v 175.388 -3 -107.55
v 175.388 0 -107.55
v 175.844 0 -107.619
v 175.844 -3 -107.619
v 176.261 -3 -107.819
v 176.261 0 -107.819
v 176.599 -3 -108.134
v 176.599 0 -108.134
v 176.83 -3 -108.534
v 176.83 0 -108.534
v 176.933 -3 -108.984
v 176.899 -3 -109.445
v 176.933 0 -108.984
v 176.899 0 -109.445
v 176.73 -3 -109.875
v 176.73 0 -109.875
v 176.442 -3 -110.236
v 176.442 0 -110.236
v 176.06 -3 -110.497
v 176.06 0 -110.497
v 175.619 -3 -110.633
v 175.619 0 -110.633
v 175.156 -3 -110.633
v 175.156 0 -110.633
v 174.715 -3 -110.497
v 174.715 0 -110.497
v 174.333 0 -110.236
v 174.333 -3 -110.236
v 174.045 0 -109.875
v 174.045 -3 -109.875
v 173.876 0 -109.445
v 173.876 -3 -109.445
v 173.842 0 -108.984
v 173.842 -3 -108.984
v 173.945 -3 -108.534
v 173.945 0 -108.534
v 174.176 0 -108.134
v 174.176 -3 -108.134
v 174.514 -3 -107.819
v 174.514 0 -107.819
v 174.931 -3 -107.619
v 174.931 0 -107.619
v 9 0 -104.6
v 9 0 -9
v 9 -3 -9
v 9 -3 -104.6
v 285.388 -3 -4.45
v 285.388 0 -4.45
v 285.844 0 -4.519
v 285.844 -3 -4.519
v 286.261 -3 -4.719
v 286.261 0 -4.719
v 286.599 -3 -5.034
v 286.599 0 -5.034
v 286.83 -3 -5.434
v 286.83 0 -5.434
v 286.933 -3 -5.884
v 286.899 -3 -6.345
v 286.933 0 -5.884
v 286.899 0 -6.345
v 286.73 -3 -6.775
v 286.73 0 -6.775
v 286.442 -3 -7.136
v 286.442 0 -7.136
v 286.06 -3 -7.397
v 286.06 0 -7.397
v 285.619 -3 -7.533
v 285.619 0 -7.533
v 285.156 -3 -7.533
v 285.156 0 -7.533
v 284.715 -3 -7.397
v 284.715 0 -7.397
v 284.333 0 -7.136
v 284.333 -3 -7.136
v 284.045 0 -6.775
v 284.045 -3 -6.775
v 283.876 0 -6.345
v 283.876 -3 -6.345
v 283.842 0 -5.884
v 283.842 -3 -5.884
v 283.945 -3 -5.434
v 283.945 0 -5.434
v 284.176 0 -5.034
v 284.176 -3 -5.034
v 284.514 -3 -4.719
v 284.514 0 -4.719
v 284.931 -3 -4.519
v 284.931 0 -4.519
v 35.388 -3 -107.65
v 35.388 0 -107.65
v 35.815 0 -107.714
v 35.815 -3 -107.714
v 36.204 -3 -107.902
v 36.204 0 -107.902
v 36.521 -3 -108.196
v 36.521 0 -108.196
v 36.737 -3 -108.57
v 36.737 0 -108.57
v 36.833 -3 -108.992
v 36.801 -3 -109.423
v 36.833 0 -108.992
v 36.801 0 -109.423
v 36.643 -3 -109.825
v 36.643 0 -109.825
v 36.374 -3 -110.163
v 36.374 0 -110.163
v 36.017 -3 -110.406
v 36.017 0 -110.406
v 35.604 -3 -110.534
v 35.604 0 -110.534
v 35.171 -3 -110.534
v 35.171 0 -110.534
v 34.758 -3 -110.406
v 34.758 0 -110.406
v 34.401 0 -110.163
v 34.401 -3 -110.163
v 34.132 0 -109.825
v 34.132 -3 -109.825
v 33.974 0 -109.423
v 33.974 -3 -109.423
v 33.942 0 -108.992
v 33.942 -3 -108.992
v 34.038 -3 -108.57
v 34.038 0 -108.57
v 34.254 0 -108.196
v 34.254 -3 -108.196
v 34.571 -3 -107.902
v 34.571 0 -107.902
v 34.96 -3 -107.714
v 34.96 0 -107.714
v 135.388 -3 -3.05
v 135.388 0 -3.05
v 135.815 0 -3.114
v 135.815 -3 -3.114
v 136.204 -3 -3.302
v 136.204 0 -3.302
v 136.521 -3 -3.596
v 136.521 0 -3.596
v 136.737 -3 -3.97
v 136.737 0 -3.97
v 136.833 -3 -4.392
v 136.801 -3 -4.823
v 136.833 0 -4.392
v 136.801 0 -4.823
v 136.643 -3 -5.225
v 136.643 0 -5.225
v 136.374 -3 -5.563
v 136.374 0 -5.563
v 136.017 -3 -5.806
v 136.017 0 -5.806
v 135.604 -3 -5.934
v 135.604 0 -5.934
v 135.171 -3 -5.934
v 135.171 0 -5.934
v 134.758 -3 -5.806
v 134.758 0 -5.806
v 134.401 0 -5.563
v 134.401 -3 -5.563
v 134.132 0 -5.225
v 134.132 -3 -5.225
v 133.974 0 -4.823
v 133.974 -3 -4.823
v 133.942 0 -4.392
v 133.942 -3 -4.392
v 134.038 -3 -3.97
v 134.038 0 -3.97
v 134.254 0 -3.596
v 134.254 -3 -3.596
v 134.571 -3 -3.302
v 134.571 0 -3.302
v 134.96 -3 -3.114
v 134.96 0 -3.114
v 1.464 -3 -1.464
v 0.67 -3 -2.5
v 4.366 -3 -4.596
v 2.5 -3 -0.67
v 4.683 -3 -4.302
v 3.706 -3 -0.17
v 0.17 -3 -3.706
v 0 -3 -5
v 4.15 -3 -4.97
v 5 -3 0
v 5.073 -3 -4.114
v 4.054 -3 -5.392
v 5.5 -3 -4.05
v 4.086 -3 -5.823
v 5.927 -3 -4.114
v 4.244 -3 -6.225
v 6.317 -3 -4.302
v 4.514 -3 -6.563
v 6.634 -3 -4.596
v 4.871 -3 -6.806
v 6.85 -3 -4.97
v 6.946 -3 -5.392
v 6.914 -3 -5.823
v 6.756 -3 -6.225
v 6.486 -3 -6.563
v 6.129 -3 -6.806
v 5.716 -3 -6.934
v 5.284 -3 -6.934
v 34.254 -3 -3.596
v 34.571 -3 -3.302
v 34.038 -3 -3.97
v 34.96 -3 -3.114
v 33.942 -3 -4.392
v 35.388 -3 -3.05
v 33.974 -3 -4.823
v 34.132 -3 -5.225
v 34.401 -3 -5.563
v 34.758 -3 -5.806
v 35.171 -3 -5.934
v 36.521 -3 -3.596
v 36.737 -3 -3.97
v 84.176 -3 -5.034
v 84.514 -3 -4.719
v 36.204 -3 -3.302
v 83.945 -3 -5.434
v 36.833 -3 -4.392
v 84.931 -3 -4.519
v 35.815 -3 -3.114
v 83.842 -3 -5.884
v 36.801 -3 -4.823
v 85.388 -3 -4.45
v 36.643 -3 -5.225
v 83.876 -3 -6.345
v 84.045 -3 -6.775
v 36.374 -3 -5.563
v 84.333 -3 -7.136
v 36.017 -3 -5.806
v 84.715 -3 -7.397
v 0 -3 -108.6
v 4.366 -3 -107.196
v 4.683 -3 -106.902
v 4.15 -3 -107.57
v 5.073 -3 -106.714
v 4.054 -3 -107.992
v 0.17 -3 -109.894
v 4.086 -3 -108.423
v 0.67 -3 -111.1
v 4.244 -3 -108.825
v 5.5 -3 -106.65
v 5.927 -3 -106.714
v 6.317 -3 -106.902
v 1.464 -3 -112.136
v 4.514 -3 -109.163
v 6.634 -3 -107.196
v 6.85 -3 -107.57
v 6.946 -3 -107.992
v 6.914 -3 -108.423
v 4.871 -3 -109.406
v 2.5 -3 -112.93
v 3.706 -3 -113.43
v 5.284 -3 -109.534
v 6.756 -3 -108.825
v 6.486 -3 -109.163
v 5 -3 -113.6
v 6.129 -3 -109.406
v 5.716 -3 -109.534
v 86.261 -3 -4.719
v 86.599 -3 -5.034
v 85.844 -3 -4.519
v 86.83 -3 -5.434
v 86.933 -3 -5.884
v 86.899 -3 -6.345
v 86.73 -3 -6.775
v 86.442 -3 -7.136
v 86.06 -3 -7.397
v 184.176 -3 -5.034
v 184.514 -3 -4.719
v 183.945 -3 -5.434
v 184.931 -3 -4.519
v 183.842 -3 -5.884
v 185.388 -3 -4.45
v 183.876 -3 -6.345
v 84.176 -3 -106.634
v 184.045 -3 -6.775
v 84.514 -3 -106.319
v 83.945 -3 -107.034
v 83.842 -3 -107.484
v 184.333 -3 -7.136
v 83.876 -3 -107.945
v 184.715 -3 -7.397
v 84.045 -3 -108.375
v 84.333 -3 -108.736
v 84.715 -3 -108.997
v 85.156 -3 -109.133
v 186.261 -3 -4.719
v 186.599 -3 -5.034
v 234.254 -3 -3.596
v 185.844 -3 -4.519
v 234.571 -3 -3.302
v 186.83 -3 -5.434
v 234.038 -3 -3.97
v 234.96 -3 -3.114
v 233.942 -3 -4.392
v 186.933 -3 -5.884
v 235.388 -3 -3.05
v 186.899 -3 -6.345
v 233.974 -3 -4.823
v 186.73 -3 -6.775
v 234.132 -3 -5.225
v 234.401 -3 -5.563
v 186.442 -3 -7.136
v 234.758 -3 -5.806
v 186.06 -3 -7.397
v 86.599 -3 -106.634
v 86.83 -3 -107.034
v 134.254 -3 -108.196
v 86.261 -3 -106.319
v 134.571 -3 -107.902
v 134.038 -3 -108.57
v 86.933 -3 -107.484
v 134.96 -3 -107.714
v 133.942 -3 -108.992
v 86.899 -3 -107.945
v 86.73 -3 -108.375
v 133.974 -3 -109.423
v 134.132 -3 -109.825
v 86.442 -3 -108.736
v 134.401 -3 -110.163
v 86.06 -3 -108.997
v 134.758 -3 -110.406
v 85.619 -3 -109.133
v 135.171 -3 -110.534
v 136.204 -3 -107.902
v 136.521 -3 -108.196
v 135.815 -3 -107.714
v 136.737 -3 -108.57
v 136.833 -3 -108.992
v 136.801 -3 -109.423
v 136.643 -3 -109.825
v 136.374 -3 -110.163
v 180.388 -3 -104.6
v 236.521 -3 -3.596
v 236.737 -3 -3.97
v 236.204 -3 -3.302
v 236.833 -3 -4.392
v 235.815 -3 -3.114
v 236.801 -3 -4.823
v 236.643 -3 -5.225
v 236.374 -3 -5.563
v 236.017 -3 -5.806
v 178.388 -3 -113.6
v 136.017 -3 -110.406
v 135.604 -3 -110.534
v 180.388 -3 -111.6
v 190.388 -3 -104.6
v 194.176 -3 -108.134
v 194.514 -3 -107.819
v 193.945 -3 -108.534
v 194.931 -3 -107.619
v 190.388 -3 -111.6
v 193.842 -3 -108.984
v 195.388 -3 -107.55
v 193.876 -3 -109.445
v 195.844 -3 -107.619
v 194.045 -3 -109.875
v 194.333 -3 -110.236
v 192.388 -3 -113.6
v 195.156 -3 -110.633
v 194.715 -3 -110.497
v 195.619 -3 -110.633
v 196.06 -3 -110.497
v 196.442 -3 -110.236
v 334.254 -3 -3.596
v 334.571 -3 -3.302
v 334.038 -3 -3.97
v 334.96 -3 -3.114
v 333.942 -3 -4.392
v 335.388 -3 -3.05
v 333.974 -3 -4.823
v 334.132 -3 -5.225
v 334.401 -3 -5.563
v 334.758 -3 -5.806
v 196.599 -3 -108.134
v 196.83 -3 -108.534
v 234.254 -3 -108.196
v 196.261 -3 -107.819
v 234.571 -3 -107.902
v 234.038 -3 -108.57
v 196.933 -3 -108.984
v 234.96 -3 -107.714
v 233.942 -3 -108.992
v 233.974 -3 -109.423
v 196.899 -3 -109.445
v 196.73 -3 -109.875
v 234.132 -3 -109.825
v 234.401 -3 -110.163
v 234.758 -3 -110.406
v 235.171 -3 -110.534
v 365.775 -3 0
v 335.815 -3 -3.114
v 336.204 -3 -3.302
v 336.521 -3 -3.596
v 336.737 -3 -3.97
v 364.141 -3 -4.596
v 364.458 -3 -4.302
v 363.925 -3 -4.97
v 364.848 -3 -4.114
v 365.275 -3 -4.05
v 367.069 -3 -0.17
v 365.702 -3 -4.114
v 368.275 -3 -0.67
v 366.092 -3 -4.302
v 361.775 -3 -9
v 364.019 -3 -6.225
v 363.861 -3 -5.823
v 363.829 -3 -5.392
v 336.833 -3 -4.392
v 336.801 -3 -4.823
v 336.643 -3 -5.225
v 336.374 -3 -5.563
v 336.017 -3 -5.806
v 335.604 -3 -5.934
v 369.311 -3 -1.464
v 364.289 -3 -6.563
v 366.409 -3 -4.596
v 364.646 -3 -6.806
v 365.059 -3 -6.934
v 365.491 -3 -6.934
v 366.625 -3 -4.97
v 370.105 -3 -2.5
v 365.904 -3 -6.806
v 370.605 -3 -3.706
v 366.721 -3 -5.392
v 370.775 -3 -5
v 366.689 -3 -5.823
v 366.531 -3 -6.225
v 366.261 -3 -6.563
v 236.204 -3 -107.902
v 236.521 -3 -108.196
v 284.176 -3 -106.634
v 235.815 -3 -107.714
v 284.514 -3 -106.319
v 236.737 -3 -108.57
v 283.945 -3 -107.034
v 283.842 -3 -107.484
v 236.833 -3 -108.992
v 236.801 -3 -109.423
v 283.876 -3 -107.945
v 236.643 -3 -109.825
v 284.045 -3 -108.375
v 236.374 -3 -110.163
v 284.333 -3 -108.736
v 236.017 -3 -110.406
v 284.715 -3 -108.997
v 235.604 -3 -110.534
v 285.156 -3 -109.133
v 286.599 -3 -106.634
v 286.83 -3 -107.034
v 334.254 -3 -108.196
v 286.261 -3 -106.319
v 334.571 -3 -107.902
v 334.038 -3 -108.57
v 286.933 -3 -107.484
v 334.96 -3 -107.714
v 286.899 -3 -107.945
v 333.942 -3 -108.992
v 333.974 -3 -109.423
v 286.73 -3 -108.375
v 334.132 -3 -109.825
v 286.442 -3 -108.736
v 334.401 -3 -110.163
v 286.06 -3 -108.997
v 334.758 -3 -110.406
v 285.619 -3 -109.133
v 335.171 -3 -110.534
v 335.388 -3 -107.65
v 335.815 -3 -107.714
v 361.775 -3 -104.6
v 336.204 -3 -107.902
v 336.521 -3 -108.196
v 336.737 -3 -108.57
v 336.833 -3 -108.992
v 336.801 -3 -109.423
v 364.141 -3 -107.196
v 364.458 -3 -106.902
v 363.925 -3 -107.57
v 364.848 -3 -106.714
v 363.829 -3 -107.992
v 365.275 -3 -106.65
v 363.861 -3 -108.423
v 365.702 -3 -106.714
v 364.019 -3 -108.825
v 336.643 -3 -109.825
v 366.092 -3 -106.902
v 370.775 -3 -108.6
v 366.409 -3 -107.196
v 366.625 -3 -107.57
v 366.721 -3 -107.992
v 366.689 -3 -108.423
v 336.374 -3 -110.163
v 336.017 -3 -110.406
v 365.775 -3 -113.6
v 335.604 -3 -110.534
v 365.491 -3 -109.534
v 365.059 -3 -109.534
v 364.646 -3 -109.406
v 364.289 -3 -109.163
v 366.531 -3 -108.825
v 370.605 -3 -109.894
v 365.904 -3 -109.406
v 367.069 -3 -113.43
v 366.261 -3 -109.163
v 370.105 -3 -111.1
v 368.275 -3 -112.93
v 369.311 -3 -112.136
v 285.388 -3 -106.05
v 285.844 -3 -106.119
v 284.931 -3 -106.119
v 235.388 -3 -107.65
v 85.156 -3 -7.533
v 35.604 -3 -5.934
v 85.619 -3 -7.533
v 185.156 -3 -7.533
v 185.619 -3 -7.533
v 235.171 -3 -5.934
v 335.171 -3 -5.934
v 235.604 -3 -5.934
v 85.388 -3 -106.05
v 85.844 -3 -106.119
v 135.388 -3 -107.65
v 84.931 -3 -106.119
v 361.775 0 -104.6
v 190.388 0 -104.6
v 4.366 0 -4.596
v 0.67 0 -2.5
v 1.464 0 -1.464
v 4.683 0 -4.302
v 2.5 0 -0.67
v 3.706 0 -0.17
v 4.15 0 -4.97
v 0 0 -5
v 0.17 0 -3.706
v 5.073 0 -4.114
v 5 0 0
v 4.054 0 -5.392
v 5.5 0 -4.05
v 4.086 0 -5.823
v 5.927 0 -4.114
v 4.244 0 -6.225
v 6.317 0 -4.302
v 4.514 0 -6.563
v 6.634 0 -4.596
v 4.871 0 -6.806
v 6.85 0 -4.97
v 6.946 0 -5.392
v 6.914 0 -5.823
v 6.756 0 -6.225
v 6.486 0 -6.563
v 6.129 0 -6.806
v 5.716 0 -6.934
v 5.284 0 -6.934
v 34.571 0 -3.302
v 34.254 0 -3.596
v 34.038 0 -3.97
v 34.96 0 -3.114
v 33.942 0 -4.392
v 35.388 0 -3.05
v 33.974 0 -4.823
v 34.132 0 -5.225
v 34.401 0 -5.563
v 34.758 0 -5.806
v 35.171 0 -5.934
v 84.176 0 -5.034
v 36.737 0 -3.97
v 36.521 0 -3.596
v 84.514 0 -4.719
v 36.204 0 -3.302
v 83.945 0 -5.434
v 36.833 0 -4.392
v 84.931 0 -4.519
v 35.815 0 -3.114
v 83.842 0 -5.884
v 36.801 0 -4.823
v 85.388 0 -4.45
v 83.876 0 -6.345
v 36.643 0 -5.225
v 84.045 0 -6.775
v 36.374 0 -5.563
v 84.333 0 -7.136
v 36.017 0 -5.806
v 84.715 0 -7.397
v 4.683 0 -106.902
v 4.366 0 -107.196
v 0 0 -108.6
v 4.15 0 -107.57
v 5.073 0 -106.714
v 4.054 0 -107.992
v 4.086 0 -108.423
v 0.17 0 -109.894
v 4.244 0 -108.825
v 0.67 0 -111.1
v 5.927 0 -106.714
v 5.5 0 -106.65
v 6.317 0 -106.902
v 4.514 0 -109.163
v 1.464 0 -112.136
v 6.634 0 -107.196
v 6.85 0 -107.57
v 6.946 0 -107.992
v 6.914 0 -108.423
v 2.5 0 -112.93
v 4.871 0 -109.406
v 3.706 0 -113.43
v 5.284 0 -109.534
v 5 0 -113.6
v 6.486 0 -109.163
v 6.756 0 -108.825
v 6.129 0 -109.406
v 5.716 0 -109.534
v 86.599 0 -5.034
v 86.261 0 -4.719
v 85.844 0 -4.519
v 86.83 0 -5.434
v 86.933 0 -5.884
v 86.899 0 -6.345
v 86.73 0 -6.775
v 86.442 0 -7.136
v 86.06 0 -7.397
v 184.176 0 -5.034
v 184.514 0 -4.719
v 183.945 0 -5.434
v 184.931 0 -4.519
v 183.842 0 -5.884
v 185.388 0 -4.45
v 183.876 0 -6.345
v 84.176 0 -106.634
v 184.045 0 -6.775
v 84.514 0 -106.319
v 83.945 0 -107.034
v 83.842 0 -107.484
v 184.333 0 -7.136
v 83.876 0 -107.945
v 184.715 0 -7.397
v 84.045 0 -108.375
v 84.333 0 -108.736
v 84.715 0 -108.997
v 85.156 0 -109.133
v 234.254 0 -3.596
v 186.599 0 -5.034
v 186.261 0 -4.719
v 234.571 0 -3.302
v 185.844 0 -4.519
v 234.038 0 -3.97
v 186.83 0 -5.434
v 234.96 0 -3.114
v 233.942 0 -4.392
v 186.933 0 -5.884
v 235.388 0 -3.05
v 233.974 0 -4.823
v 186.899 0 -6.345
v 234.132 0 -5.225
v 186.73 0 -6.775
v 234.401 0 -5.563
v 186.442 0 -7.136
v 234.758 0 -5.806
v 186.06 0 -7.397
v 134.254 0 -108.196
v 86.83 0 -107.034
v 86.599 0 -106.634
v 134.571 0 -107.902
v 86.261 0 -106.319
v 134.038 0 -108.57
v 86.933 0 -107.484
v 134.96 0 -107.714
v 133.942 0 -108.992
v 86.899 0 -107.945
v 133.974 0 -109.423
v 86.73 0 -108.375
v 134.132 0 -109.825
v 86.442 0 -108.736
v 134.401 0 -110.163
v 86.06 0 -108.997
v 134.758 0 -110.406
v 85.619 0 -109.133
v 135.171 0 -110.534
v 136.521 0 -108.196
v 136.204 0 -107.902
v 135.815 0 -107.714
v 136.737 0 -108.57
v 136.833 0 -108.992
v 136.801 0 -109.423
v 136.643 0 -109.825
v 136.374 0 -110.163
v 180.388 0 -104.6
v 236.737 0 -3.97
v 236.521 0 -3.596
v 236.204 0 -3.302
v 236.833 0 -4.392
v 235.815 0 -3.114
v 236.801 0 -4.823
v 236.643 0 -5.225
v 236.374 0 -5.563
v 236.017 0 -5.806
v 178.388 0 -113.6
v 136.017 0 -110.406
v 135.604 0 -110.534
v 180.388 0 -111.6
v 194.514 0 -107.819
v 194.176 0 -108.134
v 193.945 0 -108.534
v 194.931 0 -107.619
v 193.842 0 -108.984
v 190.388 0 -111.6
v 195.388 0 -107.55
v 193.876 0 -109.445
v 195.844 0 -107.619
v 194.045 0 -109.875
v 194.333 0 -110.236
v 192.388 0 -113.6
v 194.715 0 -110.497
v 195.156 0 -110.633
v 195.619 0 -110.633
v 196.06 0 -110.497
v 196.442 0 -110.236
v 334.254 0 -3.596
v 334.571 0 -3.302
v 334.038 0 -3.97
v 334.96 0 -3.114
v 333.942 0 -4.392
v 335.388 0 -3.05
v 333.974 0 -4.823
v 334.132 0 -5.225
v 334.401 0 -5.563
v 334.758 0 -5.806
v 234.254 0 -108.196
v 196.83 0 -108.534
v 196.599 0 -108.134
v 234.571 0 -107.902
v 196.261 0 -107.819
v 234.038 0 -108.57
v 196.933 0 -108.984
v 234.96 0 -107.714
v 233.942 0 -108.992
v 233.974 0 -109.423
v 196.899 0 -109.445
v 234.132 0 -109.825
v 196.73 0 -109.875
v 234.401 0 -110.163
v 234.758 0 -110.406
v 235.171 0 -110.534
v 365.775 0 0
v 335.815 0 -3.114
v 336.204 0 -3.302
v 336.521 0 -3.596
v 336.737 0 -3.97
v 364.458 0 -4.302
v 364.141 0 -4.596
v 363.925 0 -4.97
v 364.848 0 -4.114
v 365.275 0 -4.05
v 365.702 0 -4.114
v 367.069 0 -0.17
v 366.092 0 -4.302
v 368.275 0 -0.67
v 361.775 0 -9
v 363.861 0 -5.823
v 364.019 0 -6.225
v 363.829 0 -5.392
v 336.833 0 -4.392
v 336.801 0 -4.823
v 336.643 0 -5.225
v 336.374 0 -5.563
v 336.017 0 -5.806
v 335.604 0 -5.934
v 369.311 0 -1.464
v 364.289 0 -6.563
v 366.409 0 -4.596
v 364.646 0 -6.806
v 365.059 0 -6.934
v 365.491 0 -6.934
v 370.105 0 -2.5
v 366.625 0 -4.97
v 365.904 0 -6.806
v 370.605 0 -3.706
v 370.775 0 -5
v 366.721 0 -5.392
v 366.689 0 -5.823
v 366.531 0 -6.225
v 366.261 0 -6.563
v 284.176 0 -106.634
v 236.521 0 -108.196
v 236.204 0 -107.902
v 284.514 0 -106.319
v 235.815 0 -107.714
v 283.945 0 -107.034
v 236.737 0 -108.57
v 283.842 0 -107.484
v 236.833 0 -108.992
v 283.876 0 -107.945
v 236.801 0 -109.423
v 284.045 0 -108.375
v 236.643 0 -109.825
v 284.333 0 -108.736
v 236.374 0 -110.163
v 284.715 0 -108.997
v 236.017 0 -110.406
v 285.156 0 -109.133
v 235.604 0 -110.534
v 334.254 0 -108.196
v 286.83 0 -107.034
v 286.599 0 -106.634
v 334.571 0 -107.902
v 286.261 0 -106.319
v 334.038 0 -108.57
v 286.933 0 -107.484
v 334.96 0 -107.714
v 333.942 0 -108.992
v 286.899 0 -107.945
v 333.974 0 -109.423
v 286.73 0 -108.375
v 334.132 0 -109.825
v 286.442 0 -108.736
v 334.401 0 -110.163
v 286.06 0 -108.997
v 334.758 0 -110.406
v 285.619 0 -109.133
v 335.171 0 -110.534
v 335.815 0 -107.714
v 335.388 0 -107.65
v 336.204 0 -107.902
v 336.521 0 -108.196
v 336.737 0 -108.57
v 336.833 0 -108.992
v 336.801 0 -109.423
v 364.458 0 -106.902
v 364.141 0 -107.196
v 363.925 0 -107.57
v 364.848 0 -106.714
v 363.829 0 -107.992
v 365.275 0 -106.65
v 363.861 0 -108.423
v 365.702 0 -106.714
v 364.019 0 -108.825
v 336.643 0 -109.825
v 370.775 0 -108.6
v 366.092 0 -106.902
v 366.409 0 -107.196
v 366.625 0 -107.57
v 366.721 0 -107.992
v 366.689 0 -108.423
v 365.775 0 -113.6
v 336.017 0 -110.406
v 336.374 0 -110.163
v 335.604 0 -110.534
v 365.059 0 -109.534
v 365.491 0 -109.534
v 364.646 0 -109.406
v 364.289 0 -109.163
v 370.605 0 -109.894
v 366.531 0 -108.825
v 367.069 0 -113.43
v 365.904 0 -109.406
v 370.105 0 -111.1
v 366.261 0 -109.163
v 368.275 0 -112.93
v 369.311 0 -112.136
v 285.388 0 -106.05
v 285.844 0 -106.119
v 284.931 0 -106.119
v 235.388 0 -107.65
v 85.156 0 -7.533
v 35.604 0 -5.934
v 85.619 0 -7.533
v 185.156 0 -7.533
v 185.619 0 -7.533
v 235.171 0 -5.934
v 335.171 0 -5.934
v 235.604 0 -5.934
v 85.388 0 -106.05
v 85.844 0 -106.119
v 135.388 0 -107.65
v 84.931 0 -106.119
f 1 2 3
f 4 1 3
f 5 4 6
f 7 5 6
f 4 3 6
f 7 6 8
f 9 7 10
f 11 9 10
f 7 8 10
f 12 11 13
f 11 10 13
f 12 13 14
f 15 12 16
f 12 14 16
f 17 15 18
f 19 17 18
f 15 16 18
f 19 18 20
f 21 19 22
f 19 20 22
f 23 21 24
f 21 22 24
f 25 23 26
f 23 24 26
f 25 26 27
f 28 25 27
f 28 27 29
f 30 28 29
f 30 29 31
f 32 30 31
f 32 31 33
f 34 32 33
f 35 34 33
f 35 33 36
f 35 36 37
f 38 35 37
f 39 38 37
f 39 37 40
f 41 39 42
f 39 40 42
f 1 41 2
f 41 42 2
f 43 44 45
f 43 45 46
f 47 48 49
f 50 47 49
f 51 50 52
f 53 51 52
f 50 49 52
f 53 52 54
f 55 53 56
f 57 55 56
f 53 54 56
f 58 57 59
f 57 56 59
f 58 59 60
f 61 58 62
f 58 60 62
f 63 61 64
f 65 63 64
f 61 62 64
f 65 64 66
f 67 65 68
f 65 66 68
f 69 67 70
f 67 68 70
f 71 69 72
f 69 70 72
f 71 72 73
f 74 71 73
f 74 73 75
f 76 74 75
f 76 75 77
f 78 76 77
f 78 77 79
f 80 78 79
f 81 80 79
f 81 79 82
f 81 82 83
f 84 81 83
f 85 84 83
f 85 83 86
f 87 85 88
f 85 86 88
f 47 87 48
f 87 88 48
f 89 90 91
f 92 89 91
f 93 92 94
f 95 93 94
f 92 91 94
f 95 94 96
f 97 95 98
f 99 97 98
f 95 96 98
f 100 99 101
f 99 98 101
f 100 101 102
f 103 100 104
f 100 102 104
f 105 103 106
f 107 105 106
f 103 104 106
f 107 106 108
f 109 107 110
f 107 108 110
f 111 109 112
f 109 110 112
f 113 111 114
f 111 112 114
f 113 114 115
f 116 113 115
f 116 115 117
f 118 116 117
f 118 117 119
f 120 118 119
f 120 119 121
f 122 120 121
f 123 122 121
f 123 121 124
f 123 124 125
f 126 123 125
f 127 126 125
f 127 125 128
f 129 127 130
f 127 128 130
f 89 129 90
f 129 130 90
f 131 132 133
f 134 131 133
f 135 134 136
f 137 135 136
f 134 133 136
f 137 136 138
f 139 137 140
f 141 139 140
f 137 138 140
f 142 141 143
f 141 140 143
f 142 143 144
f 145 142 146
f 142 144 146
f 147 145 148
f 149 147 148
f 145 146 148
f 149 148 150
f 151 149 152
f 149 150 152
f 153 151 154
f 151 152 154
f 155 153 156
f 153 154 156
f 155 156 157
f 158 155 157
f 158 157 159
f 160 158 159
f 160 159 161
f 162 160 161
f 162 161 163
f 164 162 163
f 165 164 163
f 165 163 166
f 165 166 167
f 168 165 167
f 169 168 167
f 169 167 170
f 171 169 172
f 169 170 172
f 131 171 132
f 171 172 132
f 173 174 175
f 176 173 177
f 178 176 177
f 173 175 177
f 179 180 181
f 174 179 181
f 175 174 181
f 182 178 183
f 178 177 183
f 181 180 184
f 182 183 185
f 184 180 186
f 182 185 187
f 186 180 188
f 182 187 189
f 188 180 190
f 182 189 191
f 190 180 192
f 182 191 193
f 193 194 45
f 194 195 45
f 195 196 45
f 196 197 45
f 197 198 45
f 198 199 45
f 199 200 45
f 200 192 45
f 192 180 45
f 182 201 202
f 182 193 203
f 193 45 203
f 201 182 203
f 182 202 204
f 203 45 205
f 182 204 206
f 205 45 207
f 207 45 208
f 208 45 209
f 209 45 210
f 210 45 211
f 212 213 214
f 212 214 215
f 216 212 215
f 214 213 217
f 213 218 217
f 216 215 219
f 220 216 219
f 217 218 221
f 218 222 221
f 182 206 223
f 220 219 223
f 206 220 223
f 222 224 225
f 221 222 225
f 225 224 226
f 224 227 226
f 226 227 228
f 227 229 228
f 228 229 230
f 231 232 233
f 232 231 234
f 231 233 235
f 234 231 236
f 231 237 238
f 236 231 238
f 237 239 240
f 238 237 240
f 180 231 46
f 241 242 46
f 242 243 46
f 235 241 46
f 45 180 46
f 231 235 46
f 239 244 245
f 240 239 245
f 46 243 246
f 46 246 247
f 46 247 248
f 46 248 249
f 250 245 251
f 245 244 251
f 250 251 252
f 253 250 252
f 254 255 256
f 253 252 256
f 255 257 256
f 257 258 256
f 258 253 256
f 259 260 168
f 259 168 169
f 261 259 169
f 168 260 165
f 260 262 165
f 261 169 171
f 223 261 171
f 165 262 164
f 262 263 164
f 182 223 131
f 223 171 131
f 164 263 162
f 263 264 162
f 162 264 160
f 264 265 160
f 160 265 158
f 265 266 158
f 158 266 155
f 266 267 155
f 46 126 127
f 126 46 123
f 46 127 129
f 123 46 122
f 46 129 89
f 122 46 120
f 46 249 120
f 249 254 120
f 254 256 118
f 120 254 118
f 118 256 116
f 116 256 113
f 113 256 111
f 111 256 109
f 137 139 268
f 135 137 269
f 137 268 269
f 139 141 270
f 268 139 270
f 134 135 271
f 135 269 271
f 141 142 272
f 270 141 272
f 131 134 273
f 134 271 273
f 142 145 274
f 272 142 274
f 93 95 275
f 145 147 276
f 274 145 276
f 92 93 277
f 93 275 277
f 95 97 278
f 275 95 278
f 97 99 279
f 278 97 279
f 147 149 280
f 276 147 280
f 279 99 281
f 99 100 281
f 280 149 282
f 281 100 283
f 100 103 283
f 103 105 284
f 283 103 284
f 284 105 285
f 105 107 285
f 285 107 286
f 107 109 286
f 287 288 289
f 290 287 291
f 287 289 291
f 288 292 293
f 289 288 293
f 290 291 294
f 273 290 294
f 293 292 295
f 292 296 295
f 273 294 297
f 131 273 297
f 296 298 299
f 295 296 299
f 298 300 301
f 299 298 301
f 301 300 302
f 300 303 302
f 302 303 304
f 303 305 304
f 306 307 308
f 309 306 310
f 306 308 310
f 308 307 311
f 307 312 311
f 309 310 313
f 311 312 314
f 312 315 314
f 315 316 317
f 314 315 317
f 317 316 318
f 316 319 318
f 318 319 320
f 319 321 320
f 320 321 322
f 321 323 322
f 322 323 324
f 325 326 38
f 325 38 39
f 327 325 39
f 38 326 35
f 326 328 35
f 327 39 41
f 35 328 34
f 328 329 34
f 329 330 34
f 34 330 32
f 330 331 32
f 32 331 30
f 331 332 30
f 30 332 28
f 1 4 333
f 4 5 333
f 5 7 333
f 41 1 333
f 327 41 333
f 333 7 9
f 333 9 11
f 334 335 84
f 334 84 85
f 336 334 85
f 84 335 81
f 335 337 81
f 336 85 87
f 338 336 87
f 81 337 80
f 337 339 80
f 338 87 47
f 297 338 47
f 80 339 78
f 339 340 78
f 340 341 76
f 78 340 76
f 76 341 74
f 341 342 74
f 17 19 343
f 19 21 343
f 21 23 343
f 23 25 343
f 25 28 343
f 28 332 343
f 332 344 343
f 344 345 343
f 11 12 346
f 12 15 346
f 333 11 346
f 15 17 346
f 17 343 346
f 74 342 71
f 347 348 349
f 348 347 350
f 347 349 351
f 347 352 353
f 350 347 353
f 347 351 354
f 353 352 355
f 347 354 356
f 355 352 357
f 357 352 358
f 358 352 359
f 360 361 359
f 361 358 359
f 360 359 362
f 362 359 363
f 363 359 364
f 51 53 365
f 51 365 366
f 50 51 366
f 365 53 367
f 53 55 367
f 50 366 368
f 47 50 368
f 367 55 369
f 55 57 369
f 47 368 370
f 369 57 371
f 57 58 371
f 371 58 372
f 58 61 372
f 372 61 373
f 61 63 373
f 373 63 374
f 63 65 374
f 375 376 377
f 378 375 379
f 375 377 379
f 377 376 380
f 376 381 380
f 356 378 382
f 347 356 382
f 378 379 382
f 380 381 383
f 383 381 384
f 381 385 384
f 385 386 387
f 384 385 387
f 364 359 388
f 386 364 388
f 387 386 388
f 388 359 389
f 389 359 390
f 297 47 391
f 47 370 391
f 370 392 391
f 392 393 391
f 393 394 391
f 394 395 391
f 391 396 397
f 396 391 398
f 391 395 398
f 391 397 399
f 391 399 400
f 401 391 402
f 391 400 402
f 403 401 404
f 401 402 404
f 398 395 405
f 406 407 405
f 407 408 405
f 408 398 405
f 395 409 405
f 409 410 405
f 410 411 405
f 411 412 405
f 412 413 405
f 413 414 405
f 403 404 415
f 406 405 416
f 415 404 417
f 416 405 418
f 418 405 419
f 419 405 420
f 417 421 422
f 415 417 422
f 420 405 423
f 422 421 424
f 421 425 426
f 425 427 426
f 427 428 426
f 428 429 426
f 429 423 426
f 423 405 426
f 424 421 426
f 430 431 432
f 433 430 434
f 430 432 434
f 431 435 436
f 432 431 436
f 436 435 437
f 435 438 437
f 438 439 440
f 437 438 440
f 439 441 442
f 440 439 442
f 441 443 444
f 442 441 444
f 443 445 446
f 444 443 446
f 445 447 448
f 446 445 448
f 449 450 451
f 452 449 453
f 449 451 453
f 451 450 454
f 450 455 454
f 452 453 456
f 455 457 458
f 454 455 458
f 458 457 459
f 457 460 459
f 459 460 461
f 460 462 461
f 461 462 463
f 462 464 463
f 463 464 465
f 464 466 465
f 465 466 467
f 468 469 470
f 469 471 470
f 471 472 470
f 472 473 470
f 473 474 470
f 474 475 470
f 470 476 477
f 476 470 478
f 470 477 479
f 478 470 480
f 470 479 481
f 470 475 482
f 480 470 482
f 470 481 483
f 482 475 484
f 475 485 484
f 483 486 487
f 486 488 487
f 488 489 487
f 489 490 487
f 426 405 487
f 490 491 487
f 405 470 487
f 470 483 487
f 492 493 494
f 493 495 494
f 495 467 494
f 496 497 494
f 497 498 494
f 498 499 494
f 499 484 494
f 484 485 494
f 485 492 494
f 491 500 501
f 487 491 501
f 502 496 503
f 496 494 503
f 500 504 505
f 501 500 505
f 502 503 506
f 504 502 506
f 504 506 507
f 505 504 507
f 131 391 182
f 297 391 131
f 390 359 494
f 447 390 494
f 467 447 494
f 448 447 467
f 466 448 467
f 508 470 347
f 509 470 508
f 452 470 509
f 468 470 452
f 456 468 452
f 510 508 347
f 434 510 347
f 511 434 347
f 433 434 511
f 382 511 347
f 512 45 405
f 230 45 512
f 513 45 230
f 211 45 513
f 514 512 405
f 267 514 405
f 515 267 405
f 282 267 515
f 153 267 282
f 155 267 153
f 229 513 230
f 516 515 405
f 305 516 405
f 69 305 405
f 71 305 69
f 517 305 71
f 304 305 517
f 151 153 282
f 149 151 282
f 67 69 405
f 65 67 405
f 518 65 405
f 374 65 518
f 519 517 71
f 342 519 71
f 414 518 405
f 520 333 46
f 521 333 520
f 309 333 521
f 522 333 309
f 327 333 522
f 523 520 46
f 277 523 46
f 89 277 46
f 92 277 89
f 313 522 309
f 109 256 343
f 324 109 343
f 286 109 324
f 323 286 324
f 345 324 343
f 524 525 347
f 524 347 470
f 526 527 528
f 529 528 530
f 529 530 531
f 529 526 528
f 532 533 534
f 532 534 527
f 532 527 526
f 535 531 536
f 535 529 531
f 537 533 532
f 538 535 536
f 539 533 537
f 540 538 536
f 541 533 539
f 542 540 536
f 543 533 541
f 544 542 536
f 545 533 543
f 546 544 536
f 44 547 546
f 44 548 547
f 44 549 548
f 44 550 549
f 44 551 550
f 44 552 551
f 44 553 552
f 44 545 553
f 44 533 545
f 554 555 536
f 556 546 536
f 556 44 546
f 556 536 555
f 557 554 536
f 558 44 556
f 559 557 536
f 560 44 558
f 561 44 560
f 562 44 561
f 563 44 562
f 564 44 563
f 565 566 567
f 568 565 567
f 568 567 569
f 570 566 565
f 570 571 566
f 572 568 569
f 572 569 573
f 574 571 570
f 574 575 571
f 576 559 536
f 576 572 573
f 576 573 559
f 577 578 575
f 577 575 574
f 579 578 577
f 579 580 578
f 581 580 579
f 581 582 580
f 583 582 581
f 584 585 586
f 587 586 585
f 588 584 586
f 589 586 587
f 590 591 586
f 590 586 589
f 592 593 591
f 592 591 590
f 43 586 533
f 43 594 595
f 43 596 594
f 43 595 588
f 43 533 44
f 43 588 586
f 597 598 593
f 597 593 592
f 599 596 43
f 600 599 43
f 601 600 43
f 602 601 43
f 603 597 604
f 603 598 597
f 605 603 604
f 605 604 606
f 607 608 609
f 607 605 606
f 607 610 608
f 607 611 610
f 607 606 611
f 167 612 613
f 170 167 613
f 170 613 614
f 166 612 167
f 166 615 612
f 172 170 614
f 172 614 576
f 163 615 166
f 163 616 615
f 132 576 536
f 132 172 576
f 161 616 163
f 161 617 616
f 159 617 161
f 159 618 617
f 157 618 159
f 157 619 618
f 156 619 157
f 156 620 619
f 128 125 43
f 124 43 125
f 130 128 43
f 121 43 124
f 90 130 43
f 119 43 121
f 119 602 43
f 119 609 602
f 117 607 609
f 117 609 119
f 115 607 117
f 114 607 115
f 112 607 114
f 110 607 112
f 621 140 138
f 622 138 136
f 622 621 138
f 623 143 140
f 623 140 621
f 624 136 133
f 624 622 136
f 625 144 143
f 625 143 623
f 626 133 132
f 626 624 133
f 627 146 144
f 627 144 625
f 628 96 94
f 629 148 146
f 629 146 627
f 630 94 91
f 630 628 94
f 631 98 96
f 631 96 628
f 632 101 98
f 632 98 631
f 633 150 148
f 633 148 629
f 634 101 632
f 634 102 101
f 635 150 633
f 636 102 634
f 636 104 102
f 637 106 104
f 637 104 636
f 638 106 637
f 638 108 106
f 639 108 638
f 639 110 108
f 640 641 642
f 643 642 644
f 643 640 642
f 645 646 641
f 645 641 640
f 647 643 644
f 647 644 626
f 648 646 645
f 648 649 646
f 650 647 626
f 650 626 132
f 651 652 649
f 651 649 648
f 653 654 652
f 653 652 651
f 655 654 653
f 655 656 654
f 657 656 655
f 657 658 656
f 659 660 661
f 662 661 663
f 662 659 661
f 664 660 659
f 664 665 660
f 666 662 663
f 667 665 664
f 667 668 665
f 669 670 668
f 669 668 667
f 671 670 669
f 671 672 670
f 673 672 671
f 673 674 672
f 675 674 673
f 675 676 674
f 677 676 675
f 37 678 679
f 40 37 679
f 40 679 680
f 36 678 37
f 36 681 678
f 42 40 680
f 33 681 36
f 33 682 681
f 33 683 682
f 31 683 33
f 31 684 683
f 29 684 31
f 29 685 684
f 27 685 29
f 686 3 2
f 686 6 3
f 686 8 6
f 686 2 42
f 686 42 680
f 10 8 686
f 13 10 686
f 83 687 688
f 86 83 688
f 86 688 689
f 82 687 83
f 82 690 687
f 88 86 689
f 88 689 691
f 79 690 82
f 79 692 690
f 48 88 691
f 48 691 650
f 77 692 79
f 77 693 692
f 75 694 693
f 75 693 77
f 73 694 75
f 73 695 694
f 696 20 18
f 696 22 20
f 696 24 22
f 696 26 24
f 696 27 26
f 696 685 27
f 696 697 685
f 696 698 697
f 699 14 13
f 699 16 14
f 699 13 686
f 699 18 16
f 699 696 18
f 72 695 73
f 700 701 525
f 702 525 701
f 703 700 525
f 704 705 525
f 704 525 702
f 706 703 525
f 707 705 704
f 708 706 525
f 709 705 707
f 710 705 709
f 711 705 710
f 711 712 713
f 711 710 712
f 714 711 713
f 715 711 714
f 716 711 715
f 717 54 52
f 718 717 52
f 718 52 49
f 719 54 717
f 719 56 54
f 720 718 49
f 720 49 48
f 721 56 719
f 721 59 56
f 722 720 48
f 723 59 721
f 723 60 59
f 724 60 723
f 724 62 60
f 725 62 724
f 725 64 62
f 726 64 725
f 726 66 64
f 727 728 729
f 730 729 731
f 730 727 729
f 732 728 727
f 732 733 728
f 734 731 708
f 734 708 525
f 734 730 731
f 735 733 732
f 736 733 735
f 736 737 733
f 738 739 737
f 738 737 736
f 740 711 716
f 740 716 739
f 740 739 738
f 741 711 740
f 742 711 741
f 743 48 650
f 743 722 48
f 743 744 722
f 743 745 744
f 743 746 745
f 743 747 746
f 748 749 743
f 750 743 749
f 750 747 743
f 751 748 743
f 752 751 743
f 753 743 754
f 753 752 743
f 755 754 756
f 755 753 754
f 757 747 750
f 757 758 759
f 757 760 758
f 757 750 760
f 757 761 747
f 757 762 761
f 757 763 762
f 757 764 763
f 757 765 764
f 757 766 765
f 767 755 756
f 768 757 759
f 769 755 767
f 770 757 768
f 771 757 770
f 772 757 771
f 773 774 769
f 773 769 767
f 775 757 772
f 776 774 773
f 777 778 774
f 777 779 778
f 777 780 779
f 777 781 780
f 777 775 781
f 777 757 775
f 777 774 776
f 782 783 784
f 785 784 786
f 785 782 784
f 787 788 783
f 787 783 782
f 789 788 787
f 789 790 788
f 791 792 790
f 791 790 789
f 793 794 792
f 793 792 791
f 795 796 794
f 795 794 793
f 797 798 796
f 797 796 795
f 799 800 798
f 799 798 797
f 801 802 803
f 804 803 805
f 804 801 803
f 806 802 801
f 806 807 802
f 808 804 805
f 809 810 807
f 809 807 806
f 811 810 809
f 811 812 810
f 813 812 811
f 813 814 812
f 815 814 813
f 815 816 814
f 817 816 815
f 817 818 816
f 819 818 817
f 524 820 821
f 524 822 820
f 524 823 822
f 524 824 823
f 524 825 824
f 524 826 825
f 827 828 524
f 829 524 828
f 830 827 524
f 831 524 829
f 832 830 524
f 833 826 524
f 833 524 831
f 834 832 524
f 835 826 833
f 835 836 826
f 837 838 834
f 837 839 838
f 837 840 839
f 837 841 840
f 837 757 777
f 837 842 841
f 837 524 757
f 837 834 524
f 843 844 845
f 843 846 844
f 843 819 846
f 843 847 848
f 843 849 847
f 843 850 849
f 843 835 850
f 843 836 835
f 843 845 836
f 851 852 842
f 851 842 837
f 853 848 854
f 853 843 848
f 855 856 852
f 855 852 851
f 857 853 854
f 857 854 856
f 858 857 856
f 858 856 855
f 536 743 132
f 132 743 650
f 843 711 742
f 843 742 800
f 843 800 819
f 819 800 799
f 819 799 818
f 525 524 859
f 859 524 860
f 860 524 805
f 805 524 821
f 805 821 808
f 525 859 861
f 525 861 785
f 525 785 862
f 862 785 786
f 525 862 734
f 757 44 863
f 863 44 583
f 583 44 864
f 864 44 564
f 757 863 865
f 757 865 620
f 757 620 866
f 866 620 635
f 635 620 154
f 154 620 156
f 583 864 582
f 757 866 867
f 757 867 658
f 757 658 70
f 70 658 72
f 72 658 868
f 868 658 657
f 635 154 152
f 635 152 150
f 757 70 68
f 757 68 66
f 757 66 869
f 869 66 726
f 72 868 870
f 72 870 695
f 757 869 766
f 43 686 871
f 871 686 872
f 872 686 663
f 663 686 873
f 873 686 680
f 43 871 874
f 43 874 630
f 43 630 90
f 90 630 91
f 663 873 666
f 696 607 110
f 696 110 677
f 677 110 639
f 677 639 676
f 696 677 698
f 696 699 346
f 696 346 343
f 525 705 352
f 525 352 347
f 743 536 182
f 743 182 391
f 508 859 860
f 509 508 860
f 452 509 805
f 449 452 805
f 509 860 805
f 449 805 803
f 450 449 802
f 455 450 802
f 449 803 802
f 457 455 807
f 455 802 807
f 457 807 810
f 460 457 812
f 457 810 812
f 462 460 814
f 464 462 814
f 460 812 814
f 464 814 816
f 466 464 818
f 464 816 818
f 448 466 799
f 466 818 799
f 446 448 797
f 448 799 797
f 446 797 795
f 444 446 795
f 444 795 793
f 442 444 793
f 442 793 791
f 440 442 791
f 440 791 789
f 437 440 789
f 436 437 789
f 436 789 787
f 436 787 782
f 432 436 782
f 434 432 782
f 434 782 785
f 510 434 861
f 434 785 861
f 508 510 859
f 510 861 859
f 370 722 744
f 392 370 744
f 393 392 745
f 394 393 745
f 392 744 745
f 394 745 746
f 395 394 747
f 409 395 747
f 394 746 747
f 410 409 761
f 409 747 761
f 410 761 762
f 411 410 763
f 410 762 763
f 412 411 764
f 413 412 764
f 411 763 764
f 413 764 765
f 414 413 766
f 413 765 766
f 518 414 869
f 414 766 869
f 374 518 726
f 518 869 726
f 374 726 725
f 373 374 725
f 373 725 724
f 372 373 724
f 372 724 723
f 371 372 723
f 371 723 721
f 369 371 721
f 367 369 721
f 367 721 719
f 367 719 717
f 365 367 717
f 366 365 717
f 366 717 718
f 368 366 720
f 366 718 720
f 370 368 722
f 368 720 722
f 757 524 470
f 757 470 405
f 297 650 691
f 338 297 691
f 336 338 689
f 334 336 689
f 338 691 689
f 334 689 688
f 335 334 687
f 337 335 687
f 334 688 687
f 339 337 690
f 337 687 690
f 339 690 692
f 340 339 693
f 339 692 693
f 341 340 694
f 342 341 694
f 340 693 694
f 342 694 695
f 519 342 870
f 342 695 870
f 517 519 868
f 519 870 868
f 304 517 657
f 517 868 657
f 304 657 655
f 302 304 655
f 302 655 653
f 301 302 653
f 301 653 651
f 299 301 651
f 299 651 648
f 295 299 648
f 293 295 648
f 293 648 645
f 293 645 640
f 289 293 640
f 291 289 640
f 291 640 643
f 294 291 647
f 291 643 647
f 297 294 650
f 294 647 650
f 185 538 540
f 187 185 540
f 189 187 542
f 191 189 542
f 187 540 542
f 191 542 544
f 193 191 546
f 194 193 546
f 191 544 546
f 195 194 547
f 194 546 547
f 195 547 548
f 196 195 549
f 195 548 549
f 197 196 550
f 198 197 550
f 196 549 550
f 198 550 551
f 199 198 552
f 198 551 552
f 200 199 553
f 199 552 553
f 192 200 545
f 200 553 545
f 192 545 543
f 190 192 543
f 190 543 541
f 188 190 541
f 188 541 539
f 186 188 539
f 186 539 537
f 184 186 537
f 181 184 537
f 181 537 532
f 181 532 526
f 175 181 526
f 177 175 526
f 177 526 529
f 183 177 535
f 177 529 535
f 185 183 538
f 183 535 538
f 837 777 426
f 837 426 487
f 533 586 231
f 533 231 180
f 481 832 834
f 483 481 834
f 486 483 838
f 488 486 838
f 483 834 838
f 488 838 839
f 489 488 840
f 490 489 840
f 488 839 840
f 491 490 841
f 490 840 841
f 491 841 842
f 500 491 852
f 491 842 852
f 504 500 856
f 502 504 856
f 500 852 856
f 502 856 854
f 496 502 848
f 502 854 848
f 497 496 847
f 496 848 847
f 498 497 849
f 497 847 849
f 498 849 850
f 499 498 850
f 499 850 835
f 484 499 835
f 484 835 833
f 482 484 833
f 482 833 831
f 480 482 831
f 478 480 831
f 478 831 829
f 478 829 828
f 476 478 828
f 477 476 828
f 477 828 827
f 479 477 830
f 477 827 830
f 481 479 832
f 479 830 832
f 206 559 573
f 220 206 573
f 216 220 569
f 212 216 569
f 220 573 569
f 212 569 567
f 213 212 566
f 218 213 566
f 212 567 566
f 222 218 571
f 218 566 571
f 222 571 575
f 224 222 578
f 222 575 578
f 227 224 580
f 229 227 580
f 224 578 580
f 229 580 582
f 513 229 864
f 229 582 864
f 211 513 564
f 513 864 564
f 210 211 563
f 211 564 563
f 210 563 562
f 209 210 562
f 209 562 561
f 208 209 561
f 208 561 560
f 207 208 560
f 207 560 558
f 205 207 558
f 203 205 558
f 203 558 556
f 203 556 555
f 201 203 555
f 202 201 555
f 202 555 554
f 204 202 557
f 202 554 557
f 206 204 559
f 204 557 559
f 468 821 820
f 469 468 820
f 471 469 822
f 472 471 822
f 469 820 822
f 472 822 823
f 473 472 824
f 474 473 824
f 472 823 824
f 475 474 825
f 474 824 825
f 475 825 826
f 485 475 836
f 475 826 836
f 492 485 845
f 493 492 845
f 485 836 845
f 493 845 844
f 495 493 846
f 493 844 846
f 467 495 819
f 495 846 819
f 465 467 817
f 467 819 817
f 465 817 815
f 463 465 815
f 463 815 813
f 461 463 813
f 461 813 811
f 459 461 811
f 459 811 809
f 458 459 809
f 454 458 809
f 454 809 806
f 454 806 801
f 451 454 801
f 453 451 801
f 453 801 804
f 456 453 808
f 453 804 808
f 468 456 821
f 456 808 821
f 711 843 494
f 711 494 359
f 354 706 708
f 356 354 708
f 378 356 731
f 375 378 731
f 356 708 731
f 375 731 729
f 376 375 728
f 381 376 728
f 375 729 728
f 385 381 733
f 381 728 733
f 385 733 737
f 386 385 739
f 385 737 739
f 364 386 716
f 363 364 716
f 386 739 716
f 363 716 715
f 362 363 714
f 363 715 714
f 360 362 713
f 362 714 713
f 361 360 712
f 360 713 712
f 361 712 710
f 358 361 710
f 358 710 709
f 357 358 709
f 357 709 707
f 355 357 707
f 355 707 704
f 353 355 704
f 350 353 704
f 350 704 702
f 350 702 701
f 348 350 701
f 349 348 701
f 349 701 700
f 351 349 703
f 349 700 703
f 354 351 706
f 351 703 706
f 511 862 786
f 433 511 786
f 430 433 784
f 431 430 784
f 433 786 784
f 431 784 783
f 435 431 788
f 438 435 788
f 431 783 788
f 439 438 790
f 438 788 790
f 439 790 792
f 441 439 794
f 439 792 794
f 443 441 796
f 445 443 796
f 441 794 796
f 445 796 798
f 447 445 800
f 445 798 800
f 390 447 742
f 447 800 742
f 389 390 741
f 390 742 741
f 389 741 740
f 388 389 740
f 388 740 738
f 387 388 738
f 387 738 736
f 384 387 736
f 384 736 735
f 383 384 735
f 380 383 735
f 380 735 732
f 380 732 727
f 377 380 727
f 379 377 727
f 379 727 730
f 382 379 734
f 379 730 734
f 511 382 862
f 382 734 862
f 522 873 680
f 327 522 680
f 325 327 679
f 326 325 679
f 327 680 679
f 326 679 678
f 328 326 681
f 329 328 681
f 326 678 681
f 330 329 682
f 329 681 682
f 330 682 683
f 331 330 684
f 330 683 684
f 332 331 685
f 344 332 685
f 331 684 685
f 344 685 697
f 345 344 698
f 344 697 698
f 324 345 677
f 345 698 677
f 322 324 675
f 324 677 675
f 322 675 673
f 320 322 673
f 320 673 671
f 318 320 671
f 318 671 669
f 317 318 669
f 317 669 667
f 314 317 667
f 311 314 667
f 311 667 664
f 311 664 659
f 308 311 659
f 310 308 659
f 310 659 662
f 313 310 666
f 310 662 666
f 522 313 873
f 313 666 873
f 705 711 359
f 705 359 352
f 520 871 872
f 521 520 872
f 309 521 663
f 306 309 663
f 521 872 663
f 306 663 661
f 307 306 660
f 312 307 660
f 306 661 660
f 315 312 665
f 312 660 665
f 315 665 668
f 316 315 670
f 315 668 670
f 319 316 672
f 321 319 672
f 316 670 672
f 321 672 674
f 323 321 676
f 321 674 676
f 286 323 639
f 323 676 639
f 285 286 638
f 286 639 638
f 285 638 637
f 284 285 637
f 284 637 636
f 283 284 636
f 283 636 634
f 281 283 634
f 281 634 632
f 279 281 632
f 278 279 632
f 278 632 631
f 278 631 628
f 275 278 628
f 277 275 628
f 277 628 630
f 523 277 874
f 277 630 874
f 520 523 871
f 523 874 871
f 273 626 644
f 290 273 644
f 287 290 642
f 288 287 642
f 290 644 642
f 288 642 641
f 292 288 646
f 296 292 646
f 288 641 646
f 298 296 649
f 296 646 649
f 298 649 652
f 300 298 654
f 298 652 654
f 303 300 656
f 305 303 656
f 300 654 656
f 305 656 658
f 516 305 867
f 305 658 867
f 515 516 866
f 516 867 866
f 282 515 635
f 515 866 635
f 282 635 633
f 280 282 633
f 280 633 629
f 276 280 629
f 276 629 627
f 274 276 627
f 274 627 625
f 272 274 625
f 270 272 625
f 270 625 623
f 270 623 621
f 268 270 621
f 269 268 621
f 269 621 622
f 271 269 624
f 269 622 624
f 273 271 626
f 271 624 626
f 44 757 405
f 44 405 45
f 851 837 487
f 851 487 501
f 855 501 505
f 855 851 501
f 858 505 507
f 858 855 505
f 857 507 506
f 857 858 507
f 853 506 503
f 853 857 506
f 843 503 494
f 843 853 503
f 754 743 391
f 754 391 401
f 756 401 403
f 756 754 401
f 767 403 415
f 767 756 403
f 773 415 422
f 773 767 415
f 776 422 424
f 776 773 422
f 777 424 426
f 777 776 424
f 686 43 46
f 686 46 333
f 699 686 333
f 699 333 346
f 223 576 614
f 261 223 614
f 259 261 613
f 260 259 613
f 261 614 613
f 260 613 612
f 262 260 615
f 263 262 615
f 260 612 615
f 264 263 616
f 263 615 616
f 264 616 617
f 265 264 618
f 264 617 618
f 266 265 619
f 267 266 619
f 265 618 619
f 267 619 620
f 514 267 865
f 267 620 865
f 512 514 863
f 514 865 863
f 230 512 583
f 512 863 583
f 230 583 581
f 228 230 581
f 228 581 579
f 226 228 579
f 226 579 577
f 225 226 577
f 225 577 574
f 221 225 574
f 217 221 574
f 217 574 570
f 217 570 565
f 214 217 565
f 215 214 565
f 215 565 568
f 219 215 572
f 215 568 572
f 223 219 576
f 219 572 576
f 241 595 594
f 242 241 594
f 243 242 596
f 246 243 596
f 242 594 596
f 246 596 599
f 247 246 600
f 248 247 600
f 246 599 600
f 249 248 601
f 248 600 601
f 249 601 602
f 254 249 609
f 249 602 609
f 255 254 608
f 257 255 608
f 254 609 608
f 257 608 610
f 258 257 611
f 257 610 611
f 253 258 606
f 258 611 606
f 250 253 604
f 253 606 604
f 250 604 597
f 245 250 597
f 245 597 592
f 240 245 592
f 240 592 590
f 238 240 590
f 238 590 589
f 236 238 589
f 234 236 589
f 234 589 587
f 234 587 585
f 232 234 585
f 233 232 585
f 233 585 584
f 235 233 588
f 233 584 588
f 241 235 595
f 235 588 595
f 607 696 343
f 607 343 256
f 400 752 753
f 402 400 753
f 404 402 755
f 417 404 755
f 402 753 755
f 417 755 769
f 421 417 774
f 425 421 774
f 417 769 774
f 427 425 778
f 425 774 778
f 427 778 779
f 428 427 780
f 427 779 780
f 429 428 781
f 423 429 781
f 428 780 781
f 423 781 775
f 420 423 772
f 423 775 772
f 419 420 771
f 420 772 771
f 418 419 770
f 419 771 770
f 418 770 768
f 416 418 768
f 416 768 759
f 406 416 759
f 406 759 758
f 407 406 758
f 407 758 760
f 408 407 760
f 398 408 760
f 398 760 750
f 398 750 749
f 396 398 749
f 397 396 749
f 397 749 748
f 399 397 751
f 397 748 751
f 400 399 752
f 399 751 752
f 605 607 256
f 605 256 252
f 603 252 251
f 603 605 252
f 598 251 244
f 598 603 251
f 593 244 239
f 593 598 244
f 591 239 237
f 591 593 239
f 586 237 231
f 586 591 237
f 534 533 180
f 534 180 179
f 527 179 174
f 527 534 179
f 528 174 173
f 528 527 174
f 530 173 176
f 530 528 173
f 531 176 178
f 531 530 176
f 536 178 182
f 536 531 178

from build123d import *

# Parameters (mm, degrees)
SKETCH1_R           = 1.45
SKETCH1_R_2         = 1.55
BOSS_EXTRUDE1_DEPTH = 3


with BuildPart() as part:
    # Sketch1 → Boss-Extrude1 (new body)
    with BuildSketch(Plane(origin=(0, 0, 0), x_dir=(1, 0, 0), z_dir=(0, 1, 0))):
        with BuildLine():
            Line((6.611e-06, 108.600000663), (6.611e-06, 5.000000663))
            ThreePointArc((6.611e-06, 5.000000663), (1.464472705, 1.464466757), (5.000006611, 6.63e-07))
            Line((5.000006611, 6.63e-07), (365.775006611, 6.63e-07))
            ThreePointArc((365.775006611, 6.63e-07), (369.310540517, 1.464466757), (370.775006611, 5.000000663))
            Line((370.775006611, 5.000000663), (370.775006611, 108.600000663))
            ThreePointArc((370.775006611, 108.600000663), (369.310540517, 112.135534569), (365.775006611, 113.600000663))
            Line((365.775006611, 113.600000663), (192.387506611, 113.600000663))
            Line((192.387506611, 113.600000663), (190.387506611, 111.600000663))
            Line((190.387506611, 111.600000663), (190.387506611, 104.600000663))
            Line((190.387506611, 104.600000663), (361.775006611, 104.600000663))
            Line((361.775006611, 104.600000663), (361.775006611, 9.000000663))
            Line((361.775006611, 9.000000663), (9.000006611, 9.000000663))
            Line((9.000006611, 9.000000663), (9.000006611, 104.600000663))
            Line((9.000006611, 104.600000663), (180.387506611, 104.600000663))
            Line((180.387506611, 104.600000663), (180.387506611, 111.600000663))
            Line((180.387506611, 111.600000663), (178.387506611, 113.600000663))
            Line((178.387506611, 113.600000663), (5.000006611, 113.600000663))
            ThreePointArc((5.000006611, 113.600000663), (1.464472705, 112.135534569), (6.611e-06, 108.600000663))
        make_face()
        with Locations(Location((35.387506611, 4.500000663, 0), (0, 0, 270))):
            Circle(SKETCH1_R, mode=Mode.SUBTRACT)
        with Locations(Location((135.387506611, 4.500000663, 0), (0, 0, 270))):
            Circle(SKETCH1_R, mode=Mode.SUBTRACT)
        with Locations(Location((335.387506611, 4.500000663, 0), (0, 0, 270))):
            Circle(SKETCH1_R, mode=Mode.SUBTRACT)
        with Locations(Location((235.387506611, 4.500000663, 0), (0, 0, 270))):
            Circle(SKETCH1_R, mode=Mode.SUBTRACT)
        with Locations(Location((35.387506611, 109.100000663, 0), (0, 0, 270))):
            Circle(SKETCH1_R, mode=Mode.SUBTRACT)
        with Locations(Location((135.387506611, 109.100000663, 0), (0, 0, 270))):
            Circle(SKETCH1_R, mode=Mode.SUBTRACT)
        with Locations(Location((335.387506611, 109.100000663, 0), (0, 0, 270))):
            Circle(SKETCH1_R, mode=Mode.SUBTRACT)
        with Locations(Location((235.387506611, 109.100000663, 0), (0, 0, 270))):
            Circle(SKETCH1_R, mode=Mode.SUBTRACT)
        with Locations(Location((195.387506611, 109.100000663, 0), (0, 0, 270))):
            Circle(SKETCH1_R_2, mode=Mode.SUBTRACT)
        with Locations(Location((175.387506611, 109.100000663, 0), (0, 0, 270))):
            Circle(SKETCH1_R_2, mode=Mode.SUBTRACT)
        with Locations(Location((5.500006611, 108.100000663, 0), (0, 0, 270))):
            Circle(SKETCH1_R, mode=Mode.SUBTRACT)
        with Locations(Location((5.500006611, 5.500000663, 0), (0, 0, 270))):
            Circle(SKETCH1_R, mode=Mode.SUBTRACT)
        with Locations(Location((365.275006611, 5.500000663, 0), (0, 0, 270))):
            Circle(SKETCH1_R, mode=Mode.SUBTRACT)
        with Locations(Location((365.275006611, 108.100000663, 0), (0, 0, 270))):
            Circle(SKETCH1_R, mode=Mode.SUBTRACT)
        with Locations(Location((85.387506611, 107.600000663, 0), (0, 0, 270))):
            Circle(SKETCH1_R_2, mode=Mode.SUBTRACT)
        with Locations(Location((285.387506611, 107.600000663, 0), (0, 0, 270))):
            Circle(SKETCH1_R_2, mode=Mode.SUBTRACT)
        with Locations(Location((85.387506611, 6.000000663, 0), (0, 0, 270))):
            Circle(SKETCH1_R_2, mode=Mode.SUBTRACT)
        with Locations(Location((185.387506611, 6.000000663, 0), (0, 0, 270))):
            Circle(SKETCH1_R_2, mode=Mode.SUBTRACT)
        with Locations(Location((285.387506611, 6.000000663, 0), (0, 0, 270))):
            Circle(SKETCH1_R_2, mode=Mode.SUBTRACT)
    extrude(amount=-BOSS_EXTRUDE1_DEPTH)


solid = part.part
